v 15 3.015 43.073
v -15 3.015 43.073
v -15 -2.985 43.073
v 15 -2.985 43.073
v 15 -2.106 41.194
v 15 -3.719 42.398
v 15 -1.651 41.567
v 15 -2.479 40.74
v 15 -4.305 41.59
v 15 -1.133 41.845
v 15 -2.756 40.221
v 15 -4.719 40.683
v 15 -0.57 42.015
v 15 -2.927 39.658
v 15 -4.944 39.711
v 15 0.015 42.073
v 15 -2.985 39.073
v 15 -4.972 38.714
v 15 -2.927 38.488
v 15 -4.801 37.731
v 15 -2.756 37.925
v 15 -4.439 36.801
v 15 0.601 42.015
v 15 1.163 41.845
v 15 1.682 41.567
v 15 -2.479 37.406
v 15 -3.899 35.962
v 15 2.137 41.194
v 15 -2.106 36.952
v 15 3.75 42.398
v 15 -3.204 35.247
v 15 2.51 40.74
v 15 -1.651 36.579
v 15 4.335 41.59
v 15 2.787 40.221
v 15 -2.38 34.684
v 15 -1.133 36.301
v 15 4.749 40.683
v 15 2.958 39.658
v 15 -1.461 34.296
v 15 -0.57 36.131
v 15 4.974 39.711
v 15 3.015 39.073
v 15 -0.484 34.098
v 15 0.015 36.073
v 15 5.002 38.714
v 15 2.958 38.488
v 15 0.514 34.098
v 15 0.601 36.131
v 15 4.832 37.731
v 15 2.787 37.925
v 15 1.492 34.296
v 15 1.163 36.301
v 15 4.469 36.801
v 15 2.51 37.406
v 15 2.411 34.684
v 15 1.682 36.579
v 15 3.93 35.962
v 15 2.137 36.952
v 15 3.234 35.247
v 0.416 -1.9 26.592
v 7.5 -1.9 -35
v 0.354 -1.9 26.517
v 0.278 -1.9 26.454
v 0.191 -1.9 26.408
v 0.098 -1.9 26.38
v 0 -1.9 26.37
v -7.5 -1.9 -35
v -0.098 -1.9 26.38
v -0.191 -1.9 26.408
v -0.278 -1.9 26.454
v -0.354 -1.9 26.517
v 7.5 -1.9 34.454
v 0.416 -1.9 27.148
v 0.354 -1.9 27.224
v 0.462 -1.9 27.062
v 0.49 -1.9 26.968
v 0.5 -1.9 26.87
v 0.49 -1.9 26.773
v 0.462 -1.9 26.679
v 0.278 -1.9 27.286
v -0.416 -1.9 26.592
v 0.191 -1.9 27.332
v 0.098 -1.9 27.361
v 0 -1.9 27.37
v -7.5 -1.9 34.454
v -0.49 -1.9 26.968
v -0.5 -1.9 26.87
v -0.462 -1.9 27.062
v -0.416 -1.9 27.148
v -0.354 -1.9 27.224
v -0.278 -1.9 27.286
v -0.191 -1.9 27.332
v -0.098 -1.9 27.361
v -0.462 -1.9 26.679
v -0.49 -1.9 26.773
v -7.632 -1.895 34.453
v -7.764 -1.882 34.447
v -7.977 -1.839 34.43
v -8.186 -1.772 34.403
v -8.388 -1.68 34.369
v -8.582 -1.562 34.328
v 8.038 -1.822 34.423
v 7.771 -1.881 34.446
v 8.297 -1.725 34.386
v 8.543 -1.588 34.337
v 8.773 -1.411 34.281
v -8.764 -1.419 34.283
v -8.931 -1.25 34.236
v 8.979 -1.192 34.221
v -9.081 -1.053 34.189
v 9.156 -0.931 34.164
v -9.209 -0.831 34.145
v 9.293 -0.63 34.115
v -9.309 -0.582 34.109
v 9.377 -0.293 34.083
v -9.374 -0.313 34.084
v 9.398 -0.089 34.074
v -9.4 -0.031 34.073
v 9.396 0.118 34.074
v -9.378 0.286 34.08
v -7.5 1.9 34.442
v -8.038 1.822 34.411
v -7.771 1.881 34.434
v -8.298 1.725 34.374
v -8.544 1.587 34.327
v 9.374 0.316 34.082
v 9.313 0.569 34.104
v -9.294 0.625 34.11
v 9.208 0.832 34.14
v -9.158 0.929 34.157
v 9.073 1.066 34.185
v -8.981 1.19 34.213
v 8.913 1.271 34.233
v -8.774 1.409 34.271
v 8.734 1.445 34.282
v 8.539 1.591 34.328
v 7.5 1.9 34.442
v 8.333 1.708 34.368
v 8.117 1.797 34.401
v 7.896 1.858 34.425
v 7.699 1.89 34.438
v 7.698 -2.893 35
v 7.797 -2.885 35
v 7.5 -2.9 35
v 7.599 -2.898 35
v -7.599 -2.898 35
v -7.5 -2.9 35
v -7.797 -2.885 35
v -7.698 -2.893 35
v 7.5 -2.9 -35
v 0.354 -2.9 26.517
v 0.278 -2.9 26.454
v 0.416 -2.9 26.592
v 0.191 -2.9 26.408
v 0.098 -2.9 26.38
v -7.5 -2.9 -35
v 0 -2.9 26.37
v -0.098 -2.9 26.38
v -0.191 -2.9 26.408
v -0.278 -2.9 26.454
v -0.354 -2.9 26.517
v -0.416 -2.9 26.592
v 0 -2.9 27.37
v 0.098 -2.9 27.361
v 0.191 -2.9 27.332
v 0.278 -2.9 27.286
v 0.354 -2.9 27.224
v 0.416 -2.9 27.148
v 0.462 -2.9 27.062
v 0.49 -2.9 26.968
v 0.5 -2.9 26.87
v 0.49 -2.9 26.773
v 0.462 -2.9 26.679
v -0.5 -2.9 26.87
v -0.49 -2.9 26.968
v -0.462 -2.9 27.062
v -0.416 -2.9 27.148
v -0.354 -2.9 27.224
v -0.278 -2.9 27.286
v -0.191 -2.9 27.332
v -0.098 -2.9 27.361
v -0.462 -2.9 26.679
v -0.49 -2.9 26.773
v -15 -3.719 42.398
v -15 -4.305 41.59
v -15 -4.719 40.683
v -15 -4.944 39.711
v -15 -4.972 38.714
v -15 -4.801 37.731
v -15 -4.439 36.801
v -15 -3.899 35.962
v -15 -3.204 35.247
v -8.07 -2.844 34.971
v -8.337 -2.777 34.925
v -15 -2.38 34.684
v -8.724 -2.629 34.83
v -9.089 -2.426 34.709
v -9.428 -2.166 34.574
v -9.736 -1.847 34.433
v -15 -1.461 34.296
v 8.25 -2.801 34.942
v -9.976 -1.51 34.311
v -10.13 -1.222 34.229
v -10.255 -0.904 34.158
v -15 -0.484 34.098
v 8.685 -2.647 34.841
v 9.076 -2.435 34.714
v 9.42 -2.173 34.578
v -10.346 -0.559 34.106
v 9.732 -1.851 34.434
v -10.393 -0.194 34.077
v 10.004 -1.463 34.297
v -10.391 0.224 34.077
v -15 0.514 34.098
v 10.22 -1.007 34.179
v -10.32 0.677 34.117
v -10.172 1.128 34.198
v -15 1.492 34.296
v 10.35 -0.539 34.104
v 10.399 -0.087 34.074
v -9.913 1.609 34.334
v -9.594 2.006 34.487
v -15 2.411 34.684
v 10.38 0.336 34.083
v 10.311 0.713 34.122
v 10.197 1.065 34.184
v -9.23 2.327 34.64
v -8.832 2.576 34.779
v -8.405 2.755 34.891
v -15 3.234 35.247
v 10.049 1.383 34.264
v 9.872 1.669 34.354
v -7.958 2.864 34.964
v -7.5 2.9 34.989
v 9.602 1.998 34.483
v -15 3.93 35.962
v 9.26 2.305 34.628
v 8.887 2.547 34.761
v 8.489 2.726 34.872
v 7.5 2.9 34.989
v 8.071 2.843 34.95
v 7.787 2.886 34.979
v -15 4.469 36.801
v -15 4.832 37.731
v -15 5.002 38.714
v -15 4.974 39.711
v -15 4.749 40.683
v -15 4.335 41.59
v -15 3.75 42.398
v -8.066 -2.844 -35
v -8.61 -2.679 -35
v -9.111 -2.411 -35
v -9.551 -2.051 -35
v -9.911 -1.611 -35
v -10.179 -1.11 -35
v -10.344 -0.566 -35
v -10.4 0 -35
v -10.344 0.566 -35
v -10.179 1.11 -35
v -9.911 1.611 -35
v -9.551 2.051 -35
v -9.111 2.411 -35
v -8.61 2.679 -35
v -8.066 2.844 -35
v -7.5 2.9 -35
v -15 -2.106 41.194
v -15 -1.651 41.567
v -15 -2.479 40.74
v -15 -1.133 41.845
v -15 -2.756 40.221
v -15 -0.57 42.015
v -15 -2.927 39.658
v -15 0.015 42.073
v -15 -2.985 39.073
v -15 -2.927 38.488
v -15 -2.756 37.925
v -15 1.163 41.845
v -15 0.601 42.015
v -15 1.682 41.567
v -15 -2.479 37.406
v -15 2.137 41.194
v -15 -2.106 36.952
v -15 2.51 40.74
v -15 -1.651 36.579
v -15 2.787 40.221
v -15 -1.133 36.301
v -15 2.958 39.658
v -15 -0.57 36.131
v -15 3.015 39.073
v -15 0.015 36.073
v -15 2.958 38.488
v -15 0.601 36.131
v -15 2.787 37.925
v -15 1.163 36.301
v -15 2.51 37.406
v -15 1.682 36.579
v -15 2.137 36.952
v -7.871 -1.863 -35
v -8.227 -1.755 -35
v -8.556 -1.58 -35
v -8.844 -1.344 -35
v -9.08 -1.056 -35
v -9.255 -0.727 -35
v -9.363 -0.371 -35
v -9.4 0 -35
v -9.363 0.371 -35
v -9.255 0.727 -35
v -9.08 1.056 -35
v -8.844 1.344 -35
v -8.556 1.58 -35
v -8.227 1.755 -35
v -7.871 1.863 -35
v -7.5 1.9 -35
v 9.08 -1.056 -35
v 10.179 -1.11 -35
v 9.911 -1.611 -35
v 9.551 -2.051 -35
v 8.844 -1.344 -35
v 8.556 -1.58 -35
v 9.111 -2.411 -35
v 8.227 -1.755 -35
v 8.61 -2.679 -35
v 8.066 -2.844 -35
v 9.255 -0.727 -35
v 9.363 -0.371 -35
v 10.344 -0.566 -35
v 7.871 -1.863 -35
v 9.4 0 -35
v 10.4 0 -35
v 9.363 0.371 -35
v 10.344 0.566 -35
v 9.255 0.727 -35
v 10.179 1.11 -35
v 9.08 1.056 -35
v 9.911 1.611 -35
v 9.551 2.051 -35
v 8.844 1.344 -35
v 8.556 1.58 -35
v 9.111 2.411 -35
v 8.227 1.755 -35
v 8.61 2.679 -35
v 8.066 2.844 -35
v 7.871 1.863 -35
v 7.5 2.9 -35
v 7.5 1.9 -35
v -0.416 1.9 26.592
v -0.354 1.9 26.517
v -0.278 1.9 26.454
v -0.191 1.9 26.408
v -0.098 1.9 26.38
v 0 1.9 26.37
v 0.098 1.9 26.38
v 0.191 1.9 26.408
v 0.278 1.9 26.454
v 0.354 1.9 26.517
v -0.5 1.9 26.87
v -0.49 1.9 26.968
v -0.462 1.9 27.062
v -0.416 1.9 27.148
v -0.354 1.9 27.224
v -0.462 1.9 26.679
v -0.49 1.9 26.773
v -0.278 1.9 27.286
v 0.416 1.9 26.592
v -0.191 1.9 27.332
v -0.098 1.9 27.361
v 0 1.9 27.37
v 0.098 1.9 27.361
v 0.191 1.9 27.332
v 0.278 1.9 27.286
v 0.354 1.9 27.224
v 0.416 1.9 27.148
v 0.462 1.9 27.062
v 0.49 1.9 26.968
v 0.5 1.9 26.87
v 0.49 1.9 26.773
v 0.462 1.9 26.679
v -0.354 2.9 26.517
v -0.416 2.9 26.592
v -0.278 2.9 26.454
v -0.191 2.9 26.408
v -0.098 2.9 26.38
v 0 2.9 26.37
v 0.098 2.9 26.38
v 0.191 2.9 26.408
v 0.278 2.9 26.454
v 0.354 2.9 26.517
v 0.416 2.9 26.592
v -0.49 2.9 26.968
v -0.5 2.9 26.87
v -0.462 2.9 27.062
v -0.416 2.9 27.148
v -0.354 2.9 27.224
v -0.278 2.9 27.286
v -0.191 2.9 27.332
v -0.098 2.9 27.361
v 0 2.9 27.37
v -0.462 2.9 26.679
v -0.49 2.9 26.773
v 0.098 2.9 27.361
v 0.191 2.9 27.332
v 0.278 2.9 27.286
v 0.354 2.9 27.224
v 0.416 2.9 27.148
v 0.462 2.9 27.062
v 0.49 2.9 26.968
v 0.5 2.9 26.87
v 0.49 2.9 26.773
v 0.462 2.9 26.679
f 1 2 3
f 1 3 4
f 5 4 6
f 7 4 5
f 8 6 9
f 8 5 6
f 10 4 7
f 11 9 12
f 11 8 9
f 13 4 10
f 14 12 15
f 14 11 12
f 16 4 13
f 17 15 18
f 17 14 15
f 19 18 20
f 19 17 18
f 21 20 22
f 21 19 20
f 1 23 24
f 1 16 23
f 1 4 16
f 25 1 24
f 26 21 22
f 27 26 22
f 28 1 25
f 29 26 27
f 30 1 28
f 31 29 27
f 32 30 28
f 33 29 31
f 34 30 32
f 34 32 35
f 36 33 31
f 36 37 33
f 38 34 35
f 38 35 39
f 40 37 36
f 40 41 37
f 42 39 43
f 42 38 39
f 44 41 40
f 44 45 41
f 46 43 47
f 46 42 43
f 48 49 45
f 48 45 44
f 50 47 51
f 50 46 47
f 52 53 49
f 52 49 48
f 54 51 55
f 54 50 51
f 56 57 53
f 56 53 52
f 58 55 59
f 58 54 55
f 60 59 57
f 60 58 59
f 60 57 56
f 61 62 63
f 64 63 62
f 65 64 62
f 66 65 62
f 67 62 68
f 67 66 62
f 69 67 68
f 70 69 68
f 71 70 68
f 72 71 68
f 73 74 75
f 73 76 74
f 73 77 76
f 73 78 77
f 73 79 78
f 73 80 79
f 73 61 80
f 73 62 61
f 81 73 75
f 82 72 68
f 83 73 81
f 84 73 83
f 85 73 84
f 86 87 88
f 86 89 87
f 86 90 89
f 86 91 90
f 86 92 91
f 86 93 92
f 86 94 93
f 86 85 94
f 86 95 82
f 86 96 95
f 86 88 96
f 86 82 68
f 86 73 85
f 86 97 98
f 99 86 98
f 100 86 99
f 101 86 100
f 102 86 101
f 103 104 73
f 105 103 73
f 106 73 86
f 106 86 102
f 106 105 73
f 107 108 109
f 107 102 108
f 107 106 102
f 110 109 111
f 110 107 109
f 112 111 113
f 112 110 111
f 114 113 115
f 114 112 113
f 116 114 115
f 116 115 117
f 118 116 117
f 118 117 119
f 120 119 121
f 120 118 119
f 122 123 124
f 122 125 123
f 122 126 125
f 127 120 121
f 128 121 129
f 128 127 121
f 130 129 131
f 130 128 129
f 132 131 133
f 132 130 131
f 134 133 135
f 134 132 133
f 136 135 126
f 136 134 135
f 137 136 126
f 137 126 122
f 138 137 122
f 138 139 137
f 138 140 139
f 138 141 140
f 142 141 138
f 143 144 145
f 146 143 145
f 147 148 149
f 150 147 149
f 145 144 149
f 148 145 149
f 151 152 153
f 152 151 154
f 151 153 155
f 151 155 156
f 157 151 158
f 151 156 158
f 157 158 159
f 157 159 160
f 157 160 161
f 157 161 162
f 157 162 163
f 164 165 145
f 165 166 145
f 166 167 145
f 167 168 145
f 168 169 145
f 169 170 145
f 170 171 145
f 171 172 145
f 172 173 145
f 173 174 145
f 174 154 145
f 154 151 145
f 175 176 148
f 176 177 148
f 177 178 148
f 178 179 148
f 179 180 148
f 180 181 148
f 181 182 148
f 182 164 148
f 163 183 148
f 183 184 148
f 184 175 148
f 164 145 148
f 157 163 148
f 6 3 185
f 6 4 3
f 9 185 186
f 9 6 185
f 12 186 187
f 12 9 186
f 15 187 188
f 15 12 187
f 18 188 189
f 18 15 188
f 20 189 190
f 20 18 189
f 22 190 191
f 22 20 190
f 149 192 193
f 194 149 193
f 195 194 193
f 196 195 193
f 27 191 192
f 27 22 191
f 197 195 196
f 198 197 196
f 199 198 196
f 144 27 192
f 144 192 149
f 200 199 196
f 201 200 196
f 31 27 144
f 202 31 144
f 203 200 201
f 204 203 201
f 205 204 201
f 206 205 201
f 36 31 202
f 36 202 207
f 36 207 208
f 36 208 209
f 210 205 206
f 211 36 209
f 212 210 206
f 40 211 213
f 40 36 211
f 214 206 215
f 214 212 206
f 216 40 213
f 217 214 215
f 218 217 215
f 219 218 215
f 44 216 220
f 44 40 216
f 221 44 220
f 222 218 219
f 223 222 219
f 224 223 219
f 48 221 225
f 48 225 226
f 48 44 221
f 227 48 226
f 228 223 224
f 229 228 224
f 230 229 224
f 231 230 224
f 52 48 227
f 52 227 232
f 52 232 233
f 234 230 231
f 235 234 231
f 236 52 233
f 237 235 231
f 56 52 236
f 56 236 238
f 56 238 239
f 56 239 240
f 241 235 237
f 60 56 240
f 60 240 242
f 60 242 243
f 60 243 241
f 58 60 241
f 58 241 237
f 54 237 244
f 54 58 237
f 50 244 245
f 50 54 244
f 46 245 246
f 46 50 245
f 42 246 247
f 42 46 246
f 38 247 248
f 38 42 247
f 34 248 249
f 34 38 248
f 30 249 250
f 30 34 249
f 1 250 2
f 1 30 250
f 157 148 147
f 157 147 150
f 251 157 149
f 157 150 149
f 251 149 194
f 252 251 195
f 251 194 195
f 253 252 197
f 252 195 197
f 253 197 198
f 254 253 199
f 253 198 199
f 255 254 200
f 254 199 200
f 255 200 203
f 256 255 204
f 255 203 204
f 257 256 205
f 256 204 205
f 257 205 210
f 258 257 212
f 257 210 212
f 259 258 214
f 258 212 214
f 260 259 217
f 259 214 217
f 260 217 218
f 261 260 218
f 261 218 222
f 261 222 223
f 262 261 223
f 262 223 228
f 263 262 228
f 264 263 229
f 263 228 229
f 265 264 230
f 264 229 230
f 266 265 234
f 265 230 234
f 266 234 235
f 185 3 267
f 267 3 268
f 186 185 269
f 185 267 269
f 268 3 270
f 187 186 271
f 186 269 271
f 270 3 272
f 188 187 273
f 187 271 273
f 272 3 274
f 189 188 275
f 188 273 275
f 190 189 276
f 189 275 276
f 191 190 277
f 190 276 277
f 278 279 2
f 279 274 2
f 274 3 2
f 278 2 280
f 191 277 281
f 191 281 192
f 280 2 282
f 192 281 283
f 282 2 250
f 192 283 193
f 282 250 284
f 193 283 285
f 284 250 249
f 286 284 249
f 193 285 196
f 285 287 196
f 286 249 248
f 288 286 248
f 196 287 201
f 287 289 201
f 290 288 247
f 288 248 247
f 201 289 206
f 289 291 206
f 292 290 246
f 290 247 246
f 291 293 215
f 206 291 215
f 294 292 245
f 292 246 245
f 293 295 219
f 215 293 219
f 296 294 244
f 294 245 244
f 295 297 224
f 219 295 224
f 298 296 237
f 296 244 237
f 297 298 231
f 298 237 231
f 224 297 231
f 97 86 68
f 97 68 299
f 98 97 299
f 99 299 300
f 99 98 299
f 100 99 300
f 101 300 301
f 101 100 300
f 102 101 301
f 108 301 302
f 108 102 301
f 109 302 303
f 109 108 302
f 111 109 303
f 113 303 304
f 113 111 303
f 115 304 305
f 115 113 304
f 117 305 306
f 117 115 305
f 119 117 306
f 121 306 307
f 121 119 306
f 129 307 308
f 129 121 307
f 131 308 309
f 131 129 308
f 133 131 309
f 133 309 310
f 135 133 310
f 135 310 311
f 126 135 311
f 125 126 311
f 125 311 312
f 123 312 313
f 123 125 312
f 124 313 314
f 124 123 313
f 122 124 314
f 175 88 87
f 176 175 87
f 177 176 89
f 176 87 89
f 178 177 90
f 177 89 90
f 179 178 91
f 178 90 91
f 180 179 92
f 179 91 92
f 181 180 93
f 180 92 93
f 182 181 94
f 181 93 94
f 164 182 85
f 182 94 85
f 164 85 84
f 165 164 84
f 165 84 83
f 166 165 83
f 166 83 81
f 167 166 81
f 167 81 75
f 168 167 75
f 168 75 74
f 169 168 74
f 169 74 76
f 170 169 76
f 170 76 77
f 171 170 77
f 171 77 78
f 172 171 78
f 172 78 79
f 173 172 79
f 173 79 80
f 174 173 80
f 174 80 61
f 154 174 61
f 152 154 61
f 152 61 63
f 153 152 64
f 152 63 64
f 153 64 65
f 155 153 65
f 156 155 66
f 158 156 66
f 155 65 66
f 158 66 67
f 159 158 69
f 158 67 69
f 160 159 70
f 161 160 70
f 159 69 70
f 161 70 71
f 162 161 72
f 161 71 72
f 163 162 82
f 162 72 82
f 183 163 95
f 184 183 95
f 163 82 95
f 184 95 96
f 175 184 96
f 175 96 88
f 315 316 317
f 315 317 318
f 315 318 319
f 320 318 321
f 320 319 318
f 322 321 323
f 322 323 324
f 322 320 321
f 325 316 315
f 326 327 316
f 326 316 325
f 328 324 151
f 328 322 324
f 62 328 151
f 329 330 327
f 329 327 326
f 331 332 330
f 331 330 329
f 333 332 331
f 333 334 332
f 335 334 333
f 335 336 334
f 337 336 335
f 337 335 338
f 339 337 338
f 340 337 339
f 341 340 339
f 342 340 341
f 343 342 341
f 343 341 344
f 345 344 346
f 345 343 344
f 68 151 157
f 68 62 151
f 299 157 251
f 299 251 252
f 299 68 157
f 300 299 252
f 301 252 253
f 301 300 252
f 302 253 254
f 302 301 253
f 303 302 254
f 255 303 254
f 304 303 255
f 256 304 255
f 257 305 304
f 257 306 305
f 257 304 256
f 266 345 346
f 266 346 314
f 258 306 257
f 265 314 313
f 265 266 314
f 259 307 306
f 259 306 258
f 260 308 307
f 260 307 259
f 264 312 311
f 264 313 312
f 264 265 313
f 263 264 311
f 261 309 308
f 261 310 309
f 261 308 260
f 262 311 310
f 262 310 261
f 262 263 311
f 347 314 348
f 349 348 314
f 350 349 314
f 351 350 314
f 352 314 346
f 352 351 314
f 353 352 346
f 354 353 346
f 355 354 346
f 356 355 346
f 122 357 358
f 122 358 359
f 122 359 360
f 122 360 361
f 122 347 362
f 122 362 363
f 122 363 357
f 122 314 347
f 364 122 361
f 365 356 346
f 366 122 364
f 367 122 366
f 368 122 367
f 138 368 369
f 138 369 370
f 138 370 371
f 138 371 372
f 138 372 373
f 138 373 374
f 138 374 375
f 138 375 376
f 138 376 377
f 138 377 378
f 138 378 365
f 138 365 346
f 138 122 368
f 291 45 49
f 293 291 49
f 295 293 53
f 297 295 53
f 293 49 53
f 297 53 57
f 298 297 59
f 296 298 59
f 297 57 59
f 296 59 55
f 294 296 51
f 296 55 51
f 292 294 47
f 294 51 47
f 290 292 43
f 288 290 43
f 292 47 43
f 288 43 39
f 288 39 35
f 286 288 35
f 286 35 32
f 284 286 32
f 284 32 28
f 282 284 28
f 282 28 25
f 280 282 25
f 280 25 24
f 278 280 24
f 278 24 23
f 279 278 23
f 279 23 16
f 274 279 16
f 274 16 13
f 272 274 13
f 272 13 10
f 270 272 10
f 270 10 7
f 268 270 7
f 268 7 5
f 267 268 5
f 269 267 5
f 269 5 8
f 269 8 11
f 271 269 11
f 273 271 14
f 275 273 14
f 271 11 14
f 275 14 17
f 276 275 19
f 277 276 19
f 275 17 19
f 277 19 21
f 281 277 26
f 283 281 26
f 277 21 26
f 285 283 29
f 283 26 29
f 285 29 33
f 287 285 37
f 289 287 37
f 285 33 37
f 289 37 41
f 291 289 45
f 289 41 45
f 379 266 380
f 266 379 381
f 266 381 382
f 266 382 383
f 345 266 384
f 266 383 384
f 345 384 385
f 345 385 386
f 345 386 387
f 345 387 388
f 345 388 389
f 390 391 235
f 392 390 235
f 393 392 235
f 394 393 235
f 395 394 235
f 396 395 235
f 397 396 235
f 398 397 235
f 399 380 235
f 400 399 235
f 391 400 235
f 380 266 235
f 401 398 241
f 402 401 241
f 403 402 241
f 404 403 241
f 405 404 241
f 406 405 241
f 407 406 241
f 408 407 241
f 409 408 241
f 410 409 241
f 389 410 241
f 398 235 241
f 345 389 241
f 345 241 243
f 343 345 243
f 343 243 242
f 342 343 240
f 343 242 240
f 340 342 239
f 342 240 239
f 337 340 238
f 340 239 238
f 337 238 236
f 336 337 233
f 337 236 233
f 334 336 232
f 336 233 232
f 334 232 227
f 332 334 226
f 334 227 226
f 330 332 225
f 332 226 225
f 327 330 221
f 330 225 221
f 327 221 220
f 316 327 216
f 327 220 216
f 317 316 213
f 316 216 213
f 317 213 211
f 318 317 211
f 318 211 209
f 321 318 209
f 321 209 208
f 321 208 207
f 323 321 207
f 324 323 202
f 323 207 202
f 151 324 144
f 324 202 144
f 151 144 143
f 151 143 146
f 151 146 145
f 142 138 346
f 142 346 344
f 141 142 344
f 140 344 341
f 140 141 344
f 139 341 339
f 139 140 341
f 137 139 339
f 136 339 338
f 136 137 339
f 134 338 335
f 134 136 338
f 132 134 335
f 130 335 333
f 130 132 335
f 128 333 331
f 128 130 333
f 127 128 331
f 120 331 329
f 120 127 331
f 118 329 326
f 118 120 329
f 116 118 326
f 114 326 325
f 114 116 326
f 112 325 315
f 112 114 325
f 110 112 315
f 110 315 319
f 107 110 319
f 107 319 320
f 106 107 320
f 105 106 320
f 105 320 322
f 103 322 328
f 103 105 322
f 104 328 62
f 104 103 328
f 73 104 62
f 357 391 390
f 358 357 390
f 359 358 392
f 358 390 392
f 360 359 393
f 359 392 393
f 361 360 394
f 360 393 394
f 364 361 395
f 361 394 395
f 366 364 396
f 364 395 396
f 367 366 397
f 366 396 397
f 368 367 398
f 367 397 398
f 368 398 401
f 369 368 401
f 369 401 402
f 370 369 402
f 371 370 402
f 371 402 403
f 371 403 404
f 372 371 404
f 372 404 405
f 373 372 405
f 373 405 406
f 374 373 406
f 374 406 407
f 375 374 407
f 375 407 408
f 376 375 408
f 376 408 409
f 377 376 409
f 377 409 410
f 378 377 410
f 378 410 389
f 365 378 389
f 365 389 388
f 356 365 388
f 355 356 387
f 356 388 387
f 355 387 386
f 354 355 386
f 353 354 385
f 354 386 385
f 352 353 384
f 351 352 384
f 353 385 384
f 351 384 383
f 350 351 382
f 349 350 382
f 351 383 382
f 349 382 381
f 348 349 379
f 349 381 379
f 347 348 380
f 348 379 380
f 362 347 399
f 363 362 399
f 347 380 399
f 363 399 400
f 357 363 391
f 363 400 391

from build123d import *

# Parameters (mm, degrees)
BOSS_EXTRUDE1_DEPTH = 35
SKETCH9_R           = 5
BOSS_EXTRUDE3_DEPTH = 15
SKETCH10_W          = 39.744762059
SKETCH10_H          = 6.949903748
CUT_EXTRUDE1_DEPTH  = 13
SKETCH11_R          = 0.5
CUT_EXTRUDE2_DEPTH  = 47.286707872
SKETCH12_R          = 3
CUT_EXTRUDE3_DEPTH  = 53.72991015


with BuildPart() as part:
    # Sketch4 → Boss-Extrude1 (new, symmetric)
    with BuildSketch(Plane.XY):
        with BuildLine():
            Line((7.5, -2.9), (-7.5, -2.9))
            ThreePointArc((-7.5, -2.9), (-10.4, 0), (-7.5, 2.9))
            Line((-7.5, 2.9), (7.5, 2.9))
            ThreePointArc((7.5, 2.9), (10.4, 0), (7.5, -2.9))
        make_face()
        with BuildLine():
            Line((7.5, -1.9), (-7.5, -1.9))
            ThreePointArc((-7.5, -1.9), (-9.4, 0), (-7.5, 1.9))
            Line((-7.5, 1.9), (7.5, 1.9))
            ThreePointArc((7.5, 1.9), (9.4, 0), (7.5, -1.9))
        make_face(mode=Mode.SUBTRACT)
    extrude(amount=BOSS_EXTRUDE1_DEPTH, both=True)

    # Sketch9 → Boss-Extrude3 (add, symmetric)
    with BuildSketch(Plane(origin=(0, 0, 0), x_dir=(0, 0, -1), z_dir=(1, 0, 0))):
        with Locations((-39.073082371, 0.015275052)):
            Circle(SKETCH9_R)
    extrude(amount=BOSS_EXTRUDE3_DEPTH, both=True)

    # Sketch10 → Cut-Extrude1 (cut, symmetric)
    with BuildSketch(Plane(origin=(0, 0, 0), x_dir=(1, 0, 0), z_dir=(0, 1, 0))):
        with Locations((-2.189570447, -46.548034245)):
            Rectangle(SKETCH10_W, SKETCH10_H)
    extrude(amount=CUT_EXTRUDE1_DEPTH, both=True, mode=Mode.SUBTRACT)

    # Sketch11 → Cut-Extrude2 (cut, through all)
    with BuildSketch(Plane(origin=(0, 2.9, 0), x_dir=(1, 0, 0), z_dir=(0, 1, 0))):
        with Locations(Location((0, -26.870162273, 0), (0, 0, 180))):
            Circle(SKETCH11_R)
    extrude(amount=-CUT_EXTRUDE2_DEPTH, mode=Mode.SUBTRACT)

    # Sketch12 → Cut-Extrude3 (cut, through all)
    with BuildSketch(Plane(origin=(15, 0, 0), x_dir=(0, 0, -1), z_dir=(1, 0, 0))):
        with Locations((-39.073082371, 0.015275052)):
            Circle(SKETCH12_R)
    extrude(amount=-CUT_EXTRUDE3_DEPTH, mode=Mode.SUBTRACT)


solid = part.part
